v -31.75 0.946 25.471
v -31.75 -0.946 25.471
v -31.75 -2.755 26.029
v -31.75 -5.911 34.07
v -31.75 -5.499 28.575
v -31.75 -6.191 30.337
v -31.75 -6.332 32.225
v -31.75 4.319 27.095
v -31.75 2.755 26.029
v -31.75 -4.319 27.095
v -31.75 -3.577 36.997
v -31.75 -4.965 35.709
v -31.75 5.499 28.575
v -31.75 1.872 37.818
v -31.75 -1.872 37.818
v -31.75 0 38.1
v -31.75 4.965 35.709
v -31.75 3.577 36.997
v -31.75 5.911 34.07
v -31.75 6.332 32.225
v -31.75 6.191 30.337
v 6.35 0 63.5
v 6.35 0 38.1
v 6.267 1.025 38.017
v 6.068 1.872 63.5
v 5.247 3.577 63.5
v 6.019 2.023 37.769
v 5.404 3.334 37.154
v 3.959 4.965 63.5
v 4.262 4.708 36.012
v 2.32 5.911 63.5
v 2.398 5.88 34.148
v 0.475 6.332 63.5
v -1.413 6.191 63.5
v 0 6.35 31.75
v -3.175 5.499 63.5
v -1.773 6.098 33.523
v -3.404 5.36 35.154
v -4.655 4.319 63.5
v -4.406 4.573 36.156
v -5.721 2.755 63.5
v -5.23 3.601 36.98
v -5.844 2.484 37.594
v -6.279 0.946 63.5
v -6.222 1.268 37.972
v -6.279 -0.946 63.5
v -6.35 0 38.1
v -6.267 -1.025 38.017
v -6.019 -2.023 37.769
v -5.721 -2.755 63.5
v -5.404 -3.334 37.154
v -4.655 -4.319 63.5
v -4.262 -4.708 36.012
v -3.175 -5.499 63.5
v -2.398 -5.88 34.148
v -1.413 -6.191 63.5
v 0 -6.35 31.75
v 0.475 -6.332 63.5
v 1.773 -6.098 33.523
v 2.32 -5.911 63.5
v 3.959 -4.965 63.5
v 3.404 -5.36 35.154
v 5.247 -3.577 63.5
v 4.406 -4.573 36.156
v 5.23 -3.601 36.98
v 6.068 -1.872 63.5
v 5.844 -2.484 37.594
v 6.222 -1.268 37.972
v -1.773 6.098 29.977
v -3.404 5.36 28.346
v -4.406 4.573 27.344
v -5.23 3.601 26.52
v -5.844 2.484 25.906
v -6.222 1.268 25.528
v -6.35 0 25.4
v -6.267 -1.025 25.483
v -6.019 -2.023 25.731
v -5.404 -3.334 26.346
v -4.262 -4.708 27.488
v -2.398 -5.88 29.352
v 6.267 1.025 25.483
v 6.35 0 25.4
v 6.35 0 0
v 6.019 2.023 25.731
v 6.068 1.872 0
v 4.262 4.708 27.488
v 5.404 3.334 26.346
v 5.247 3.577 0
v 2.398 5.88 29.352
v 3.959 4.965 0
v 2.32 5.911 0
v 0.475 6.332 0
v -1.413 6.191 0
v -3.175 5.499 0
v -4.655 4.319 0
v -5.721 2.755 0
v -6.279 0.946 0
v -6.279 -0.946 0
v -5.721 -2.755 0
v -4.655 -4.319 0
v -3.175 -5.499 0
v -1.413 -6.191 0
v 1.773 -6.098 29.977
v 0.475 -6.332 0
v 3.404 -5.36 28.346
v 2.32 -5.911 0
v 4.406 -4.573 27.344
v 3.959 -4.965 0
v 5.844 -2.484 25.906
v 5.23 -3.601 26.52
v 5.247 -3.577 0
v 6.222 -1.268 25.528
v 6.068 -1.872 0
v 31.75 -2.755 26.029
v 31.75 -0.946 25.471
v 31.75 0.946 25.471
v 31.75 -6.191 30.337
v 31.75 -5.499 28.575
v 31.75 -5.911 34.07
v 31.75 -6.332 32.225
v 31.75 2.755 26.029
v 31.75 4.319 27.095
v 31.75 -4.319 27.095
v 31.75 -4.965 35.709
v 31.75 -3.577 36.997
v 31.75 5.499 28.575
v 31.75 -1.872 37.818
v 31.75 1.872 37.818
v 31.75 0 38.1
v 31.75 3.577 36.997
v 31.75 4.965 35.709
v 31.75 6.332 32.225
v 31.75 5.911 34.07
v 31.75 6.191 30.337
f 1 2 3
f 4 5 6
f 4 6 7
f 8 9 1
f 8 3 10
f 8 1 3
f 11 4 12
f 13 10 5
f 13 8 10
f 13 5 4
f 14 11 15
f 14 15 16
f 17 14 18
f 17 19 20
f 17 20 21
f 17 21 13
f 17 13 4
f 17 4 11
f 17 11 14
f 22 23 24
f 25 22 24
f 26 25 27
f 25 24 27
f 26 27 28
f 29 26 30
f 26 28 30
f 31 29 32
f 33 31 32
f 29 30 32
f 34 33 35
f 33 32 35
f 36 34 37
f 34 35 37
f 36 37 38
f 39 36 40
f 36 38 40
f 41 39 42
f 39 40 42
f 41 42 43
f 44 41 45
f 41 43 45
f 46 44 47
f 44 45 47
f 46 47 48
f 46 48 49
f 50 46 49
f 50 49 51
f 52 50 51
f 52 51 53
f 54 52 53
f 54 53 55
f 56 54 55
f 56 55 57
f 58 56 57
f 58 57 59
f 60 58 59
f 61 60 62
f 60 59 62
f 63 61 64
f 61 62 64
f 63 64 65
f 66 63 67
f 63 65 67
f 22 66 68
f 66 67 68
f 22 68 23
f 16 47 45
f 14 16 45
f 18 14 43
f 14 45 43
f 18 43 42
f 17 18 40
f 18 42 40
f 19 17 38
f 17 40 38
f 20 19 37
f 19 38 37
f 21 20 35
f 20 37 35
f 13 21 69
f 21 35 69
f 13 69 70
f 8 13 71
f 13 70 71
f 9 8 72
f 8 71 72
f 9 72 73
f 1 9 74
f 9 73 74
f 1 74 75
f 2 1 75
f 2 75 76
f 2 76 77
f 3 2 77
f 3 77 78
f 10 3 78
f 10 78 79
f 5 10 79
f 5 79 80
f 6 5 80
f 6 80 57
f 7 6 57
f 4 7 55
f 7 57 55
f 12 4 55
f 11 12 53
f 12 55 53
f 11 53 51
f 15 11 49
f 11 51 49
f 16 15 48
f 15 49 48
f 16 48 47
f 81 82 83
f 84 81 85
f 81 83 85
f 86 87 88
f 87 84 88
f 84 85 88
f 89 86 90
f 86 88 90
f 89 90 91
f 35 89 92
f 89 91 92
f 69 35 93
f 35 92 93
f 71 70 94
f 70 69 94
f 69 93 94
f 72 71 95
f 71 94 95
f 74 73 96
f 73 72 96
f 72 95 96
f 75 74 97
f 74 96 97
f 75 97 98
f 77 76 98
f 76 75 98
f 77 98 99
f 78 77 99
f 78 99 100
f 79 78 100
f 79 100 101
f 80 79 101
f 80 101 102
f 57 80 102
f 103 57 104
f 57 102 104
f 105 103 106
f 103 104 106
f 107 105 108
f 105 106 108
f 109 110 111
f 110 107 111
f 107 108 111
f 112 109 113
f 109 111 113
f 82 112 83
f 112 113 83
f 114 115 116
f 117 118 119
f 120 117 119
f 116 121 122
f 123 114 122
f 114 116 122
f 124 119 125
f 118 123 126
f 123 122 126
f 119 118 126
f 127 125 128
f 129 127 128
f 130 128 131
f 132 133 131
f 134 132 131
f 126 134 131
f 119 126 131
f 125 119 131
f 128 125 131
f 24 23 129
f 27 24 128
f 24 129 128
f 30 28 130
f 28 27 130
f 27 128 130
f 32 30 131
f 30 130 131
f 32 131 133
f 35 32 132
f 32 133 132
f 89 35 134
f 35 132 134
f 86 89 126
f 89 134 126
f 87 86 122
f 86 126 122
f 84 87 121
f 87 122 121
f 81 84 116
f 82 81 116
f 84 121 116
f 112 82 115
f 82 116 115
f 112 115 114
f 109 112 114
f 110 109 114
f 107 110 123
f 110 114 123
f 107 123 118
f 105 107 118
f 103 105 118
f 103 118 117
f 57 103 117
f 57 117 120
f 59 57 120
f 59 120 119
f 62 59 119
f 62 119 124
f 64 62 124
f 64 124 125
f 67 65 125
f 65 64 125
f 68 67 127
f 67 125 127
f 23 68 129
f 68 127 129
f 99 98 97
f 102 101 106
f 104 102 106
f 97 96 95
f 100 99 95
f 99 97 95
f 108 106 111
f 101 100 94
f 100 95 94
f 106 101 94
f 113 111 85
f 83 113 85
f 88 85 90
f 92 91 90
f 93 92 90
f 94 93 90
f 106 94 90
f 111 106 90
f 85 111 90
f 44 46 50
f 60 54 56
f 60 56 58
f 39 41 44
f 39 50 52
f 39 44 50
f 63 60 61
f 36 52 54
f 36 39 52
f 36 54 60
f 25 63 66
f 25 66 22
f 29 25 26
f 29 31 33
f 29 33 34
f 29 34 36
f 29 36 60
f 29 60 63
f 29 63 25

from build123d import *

# Parameters (mm, degrees)
SKETCH1_R           = 6.35
BOSS_EXTRUDE1_DEPTH = 63.5
CIRPATTERN1_COUNT   = 2
CIRPATTERN1_ANGLE   = 90


with BuildPart() as part:
    # Sketch1 → Boss-Extrude1 (new body)
    with BuildSketch(Plane.XY):
        Circle(SKETCH1_R)
    boss_extrude1 = extrude(amount=BOSS_EXTRUDE1_DEPTH)

    # CirPattern1: Boss-Extrude1 ×2 about axis
    cirpattern1_axis = Axis((0, 6.35, 31.75), (0, -1, 0))
    for i in range(1, CIRPATTERN1_COUNT):
        add(boss_extrude1.rotate(cirpattern1_axis, i * CIRPATTERN1_ANGLE / (CIRPATTERN1_COUNT - 1)))


solid = part.part
